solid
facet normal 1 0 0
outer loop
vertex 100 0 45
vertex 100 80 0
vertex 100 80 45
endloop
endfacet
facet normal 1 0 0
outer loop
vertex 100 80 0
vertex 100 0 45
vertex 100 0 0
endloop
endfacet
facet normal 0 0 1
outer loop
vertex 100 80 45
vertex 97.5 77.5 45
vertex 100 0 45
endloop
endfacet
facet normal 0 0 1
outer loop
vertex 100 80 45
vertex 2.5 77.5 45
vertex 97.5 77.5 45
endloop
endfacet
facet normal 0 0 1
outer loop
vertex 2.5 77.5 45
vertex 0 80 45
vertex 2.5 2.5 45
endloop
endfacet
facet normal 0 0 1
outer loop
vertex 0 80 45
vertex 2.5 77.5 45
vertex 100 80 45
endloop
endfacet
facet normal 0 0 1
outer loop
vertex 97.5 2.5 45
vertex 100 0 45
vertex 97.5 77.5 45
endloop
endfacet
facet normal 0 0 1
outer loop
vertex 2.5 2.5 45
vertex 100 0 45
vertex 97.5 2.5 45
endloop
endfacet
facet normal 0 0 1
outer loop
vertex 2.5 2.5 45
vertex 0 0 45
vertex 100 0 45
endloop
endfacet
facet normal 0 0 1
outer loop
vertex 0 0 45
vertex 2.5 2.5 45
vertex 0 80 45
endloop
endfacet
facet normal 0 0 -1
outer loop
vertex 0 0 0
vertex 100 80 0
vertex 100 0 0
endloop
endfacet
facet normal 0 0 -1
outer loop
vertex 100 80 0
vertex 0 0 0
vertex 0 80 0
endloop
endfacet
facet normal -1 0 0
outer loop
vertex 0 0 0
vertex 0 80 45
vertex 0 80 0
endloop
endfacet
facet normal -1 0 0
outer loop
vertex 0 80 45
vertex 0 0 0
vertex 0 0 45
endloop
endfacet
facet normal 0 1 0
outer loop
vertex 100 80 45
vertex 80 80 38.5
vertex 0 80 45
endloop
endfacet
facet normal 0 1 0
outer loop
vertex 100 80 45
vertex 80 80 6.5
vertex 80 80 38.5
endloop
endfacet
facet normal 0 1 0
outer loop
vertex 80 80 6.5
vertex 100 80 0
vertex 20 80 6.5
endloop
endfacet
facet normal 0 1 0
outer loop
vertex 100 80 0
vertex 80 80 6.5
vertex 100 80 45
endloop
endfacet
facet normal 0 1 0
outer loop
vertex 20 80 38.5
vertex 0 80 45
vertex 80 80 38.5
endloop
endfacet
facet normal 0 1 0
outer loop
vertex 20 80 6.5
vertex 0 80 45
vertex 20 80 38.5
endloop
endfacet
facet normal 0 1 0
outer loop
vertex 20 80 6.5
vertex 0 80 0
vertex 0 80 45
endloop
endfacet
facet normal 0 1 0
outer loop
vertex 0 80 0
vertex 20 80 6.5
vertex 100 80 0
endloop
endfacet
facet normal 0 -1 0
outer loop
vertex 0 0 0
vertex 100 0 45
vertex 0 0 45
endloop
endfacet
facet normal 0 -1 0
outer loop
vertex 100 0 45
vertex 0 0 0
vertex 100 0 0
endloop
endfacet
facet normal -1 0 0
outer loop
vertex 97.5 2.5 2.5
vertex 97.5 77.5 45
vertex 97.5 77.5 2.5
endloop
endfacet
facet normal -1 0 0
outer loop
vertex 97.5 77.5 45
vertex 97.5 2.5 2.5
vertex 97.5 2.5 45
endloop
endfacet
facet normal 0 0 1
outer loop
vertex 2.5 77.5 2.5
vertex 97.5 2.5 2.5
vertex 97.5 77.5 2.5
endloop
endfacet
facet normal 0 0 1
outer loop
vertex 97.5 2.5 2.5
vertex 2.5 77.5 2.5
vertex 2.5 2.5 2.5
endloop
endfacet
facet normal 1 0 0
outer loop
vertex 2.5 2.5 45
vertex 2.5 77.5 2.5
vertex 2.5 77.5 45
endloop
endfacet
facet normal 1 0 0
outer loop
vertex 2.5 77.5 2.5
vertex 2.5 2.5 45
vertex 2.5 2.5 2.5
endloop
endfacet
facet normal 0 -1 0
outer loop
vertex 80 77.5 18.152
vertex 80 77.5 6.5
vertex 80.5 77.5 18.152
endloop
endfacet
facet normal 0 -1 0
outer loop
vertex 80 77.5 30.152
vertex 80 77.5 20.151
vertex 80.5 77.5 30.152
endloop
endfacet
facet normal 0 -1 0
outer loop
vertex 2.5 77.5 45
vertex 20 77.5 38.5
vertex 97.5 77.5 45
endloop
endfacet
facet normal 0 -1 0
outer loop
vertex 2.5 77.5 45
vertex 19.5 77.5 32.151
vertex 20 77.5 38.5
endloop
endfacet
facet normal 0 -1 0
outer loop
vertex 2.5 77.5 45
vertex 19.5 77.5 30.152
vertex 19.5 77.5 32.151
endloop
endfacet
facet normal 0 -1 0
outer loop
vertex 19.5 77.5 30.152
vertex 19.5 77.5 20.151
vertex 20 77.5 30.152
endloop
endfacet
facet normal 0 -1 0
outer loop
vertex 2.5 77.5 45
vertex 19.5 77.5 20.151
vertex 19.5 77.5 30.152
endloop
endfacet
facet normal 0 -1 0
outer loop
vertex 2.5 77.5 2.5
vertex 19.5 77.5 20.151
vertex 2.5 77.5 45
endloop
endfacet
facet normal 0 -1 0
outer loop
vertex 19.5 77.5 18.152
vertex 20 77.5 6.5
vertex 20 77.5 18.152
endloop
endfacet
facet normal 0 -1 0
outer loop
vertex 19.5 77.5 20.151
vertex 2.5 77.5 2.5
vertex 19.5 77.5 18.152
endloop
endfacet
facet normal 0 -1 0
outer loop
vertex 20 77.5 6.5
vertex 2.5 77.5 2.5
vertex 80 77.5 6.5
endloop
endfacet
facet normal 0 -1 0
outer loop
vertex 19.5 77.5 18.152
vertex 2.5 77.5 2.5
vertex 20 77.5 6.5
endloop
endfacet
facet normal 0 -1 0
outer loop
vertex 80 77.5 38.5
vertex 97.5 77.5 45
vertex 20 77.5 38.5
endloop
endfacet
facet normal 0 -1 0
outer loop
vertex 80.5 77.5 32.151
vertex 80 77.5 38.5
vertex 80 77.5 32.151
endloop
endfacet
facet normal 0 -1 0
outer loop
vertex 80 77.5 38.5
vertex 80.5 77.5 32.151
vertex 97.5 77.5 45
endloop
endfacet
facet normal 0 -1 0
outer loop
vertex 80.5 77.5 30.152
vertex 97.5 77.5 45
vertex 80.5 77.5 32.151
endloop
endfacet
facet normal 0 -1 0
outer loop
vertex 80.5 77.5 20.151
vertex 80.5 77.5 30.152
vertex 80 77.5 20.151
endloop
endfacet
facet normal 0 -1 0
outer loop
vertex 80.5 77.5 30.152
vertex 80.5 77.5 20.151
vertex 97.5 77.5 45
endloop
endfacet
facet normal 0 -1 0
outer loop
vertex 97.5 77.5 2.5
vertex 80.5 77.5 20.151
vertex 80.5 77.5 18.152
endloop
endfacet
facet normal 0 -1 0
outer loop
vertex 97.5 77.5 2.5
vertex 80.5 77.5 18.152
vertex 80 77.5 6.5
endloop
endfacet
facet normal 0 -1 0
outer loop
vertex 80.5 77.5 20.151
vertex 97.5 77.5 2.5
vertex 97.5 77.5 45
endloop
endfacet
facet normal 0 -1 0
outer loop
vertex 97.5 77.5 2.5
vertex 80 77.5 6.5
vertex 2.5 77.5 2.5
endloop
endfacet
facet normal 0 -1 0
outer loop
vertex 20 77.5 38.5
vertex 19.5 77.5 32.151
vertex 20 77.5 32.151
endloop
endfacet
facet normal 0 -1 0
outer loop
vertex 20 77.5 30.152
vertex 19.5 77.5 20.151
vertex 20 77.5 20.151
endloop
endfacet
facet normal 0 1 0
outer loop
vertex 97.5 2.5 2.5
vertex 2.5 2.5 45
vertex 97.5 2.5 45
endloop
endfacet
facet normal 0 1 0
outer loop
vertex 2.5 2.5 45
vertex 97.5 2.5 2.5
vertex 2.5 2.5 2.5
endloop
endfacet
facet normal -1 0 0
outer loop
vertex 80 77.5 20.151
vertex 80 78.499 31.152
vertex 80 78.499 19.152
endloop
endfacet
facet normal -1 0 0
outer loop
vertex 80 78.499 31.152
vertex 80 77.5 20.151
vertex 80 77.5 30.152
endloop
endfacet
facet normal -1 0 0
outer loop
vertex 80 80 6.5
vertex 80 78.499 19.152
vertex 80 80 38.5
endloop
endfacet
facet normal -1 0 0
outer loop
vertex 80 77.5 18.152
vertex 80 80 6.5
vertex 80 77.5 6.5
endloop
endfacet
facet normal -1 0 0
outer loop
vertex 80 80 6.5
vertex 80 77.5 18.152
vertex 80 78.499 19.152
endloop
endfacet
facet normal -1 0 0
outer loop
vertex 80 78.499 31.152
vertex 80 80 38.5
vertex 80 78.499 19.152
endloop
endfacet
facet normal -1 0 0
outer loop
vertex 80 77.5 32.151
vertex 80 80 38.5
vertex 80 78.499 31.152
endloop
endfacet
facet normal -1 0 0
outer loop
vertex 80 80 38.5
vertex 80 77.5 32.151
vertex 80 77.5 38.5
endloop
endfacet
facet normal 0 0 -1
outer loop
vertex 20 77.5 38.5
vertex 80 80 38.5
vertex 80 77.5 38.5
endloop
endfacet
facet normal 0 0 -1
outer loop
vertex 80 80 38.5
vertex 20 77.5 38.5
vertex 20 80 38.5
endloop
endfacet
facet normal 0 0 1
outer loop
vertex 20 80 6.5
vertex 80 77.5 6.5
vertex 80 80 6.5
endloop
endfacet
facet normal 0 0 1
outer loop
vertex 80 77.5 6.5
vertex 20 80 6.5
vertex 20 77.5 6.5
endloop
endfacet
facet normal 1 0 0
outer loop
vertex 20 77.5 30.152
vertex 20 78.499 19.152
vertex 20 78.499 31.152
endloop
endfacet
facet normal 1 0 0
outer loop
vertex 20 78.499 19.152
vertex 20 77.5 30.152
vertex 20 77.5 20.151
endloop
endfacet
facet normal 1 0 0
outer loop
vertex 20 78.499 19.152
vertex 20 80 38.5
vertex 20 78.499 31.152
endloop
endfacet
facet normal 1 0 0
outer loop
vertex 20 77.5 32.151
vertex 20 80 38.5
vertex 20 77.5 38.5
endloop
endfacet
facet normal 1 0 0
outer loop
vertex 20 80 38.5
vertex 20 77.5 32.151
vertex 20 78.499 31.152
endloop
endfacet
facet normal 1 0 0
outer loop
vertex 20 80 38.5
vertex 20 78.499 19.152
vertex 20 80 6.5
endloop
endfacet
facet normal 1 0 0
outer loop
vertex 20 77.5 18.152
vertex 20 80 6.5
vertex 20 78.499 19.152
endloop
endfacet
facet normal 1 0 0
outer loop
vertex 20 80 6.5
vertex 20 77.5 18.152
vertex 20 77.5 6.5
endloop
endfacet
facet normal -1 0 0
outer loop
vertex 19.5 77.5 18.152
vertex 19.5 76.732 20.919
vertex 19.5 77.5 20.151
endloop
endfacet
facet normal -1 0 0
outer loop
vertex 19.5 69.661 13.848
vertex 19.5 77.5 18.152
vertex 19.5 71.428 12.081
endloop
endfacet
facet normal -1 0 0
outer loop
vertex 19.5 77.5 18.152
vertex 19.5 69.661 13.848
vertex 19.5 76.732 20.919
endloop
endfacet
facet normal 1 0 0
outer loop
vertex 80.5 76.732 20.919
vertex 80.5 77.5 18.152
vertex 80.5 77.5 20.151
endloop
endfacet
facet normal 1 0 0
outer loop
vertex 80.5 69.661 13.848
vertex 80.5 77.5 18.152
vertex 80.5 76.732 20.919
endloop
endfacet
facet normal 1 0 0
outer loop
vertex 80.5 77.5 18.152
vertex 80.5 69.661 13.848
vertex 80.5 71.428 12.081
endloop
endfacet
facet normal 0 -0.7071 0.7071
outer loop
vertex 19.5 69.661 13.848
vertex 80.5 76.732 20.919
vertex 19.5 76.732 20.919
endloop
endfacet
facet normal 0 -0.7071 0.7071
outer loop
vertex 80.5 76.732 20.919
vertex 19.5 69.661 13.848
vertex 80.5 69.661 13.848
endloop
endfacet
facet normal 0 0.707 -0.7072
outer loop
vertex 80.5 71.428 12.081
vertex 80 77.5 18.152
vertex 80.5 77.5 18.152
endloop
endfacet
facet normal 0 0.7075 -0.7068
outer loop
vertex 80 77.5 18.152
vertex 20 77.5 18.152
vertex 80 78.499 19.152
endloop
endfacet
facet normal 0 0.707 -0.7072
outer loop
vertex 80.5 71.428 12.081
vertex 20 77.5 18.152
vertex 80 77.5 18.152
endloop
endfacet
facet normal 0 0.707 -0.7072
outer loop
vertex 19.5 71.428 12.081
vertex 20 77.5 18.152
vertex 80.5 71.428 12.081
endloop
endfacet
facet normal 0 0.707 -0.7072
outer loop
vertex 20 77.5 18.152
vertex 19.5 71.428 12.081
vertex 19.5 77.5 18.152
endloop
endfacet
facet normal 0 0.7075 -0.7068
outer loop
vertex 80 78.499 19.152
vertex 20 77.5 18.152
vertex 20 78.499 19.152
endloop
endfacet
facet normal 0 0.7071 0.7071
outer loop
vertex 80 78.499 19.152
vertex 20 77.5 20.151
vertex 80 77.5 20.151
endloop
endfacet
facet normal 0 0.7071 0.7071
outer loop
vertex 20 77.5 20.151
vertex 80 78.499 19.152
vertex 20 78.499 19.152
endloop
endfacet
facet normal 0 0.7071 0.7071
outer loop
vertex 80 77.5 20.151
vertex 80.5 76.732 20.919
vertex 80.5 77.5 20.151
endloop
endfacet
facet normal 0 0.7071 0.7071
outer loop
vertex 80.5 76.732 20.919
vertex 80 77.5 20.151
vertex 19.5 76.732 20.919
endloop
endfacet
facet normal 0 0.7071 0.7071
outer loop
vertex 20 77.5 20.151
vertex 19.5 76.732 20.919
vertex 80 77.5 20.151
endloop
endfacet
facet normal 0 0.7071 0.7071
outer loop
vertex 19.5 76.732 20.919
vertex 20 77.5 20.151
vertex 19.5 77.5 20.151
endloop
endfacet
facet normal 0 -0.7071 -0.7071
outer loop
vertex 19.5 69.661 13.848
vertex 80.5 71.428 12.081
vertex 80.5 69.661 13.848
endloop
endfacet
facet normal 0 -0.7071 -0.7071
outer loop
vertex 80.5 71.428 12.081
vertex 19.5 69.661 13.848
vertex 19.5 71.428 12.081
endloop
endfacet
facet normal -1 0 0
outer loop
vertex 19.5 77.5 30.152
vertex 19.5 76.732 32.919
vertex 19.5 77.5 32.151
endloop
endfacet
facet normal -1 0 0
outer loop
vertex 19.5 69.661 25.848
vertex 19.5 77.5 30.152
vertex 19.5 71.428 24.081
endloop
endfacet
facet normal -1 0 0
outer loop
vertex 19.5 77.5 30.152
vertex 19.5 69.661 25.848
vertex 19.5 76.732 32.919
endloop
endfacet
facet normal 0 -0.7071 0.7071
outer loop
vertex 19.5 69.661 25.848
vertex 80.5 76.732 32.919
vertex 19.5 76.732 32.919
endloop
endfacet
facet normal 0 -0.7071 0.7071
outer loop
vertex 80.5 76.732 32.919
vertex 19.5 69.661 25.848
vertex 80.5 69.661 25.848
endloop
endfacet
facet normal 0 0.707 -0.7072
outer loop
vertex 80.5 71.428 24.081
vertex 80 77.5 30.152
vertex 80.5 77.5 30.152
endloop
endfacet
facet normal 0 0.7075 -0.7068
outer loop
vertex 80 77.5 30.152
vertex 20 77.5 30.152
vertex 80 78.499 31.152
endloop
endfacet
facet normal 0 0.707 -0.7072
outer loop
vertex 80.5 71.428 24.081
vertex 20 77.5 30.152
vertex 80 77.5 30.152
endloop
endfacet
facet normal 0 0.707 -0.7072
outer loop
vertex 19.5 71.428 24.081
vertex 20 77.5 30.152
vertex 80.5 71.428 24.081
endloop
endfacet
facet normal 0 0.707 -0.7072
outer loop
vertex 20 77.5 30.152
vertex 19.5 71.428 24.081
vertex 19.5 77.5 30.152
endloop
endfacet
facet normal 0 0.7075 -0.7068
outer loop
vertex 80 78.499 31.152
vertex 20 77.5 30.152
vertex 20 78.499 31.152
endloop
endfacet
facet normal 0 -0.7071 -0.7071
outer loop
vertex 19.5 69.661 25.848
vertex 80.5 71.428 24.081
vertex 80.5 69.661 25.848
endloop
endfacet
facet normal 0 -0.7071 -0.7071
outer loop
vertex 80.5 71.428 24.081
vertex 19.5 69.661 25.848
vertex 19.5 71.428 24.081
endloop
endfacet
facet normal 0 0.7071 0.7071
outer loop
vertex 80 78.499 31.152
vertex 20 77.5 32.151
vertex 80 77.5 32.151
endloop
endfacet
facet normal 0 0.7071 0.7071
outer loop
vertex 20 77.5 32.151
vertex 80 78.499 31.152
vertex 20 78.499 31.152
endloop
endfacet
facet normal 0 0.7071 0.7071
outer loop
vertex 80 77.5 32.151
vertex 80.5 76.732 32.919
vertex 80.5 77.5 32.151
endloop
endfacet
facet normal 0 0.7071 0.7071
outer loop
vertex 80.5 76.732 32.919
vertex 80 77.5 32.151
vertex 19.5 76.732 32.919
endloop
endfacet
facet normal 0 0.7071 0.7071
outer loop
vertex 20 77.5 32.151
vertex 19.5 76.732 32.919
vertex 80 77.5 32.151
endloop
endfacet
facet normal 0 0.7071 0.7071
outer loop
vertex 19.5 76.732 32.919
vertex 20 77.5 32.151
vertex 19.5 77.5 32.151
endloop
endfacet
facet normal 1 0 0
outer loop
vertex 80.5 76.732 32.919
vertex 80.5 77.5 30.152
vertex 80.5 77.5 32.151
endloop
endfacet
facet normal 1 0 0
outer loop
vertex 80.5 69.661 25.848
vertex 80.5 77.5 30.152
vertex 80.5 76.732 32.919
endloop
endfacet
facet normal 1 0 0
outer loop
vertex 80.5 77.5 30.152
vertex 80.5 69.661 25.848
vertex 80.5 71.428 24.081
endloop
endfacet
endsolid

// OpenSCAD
$fn = 32;

// ----------------------------------------------------------------------
// Vent box: louvers enclosure
// ----------------------------------------------------------------------

// --- parameters (mm) ---
box_l = 100;              // box length, X
box_w = 80;               // box width, Y
box_h = 45;               // box height, Z
wall_t = 2.5;             // shell wall thickness
win_l = 60;               // vent window width, X
win_h = 32;               // vent window height, Z
slat_t = 2.5;             // louver slat thickness
slat_d = 10;              // louver slat depth
slat_a = 45;              // louver slat angle, degrees
slat_pitch = 12;          // louver pitch
slat_yc = 74.08;          // slat centreline Y

win_z0 = (box_h - win_h) / 2;  // window lower edge Z
n_slats = 2;  // louver count
slat_z0 = win_z0 + (win_h - (n_slats - 1) * slat_pitch) / 2;

difference() {
  union() {
    difference() {
      cube([box_l, box_w, box_h]);
  translate([wall_t, wall_t, wall_t])
    cube([box_l - 2 * wall_t, box_w - 2 * wall_t, box_h]);
  translate([(box_l - win_l) / 2, box_w - wall_t - 1, win_z0])
    cube([win_l, wall_t + 2, win_h]);
    }
    for (i = [0 : n_slats - 1])
      translate([box_l / 2, slat_yc, slat_z0 + i * slat_pitch])
        rotate([slat_a, 0, 0])
          cube([win_l + 1, slat_d, slat_t], center = true);
  }
}
